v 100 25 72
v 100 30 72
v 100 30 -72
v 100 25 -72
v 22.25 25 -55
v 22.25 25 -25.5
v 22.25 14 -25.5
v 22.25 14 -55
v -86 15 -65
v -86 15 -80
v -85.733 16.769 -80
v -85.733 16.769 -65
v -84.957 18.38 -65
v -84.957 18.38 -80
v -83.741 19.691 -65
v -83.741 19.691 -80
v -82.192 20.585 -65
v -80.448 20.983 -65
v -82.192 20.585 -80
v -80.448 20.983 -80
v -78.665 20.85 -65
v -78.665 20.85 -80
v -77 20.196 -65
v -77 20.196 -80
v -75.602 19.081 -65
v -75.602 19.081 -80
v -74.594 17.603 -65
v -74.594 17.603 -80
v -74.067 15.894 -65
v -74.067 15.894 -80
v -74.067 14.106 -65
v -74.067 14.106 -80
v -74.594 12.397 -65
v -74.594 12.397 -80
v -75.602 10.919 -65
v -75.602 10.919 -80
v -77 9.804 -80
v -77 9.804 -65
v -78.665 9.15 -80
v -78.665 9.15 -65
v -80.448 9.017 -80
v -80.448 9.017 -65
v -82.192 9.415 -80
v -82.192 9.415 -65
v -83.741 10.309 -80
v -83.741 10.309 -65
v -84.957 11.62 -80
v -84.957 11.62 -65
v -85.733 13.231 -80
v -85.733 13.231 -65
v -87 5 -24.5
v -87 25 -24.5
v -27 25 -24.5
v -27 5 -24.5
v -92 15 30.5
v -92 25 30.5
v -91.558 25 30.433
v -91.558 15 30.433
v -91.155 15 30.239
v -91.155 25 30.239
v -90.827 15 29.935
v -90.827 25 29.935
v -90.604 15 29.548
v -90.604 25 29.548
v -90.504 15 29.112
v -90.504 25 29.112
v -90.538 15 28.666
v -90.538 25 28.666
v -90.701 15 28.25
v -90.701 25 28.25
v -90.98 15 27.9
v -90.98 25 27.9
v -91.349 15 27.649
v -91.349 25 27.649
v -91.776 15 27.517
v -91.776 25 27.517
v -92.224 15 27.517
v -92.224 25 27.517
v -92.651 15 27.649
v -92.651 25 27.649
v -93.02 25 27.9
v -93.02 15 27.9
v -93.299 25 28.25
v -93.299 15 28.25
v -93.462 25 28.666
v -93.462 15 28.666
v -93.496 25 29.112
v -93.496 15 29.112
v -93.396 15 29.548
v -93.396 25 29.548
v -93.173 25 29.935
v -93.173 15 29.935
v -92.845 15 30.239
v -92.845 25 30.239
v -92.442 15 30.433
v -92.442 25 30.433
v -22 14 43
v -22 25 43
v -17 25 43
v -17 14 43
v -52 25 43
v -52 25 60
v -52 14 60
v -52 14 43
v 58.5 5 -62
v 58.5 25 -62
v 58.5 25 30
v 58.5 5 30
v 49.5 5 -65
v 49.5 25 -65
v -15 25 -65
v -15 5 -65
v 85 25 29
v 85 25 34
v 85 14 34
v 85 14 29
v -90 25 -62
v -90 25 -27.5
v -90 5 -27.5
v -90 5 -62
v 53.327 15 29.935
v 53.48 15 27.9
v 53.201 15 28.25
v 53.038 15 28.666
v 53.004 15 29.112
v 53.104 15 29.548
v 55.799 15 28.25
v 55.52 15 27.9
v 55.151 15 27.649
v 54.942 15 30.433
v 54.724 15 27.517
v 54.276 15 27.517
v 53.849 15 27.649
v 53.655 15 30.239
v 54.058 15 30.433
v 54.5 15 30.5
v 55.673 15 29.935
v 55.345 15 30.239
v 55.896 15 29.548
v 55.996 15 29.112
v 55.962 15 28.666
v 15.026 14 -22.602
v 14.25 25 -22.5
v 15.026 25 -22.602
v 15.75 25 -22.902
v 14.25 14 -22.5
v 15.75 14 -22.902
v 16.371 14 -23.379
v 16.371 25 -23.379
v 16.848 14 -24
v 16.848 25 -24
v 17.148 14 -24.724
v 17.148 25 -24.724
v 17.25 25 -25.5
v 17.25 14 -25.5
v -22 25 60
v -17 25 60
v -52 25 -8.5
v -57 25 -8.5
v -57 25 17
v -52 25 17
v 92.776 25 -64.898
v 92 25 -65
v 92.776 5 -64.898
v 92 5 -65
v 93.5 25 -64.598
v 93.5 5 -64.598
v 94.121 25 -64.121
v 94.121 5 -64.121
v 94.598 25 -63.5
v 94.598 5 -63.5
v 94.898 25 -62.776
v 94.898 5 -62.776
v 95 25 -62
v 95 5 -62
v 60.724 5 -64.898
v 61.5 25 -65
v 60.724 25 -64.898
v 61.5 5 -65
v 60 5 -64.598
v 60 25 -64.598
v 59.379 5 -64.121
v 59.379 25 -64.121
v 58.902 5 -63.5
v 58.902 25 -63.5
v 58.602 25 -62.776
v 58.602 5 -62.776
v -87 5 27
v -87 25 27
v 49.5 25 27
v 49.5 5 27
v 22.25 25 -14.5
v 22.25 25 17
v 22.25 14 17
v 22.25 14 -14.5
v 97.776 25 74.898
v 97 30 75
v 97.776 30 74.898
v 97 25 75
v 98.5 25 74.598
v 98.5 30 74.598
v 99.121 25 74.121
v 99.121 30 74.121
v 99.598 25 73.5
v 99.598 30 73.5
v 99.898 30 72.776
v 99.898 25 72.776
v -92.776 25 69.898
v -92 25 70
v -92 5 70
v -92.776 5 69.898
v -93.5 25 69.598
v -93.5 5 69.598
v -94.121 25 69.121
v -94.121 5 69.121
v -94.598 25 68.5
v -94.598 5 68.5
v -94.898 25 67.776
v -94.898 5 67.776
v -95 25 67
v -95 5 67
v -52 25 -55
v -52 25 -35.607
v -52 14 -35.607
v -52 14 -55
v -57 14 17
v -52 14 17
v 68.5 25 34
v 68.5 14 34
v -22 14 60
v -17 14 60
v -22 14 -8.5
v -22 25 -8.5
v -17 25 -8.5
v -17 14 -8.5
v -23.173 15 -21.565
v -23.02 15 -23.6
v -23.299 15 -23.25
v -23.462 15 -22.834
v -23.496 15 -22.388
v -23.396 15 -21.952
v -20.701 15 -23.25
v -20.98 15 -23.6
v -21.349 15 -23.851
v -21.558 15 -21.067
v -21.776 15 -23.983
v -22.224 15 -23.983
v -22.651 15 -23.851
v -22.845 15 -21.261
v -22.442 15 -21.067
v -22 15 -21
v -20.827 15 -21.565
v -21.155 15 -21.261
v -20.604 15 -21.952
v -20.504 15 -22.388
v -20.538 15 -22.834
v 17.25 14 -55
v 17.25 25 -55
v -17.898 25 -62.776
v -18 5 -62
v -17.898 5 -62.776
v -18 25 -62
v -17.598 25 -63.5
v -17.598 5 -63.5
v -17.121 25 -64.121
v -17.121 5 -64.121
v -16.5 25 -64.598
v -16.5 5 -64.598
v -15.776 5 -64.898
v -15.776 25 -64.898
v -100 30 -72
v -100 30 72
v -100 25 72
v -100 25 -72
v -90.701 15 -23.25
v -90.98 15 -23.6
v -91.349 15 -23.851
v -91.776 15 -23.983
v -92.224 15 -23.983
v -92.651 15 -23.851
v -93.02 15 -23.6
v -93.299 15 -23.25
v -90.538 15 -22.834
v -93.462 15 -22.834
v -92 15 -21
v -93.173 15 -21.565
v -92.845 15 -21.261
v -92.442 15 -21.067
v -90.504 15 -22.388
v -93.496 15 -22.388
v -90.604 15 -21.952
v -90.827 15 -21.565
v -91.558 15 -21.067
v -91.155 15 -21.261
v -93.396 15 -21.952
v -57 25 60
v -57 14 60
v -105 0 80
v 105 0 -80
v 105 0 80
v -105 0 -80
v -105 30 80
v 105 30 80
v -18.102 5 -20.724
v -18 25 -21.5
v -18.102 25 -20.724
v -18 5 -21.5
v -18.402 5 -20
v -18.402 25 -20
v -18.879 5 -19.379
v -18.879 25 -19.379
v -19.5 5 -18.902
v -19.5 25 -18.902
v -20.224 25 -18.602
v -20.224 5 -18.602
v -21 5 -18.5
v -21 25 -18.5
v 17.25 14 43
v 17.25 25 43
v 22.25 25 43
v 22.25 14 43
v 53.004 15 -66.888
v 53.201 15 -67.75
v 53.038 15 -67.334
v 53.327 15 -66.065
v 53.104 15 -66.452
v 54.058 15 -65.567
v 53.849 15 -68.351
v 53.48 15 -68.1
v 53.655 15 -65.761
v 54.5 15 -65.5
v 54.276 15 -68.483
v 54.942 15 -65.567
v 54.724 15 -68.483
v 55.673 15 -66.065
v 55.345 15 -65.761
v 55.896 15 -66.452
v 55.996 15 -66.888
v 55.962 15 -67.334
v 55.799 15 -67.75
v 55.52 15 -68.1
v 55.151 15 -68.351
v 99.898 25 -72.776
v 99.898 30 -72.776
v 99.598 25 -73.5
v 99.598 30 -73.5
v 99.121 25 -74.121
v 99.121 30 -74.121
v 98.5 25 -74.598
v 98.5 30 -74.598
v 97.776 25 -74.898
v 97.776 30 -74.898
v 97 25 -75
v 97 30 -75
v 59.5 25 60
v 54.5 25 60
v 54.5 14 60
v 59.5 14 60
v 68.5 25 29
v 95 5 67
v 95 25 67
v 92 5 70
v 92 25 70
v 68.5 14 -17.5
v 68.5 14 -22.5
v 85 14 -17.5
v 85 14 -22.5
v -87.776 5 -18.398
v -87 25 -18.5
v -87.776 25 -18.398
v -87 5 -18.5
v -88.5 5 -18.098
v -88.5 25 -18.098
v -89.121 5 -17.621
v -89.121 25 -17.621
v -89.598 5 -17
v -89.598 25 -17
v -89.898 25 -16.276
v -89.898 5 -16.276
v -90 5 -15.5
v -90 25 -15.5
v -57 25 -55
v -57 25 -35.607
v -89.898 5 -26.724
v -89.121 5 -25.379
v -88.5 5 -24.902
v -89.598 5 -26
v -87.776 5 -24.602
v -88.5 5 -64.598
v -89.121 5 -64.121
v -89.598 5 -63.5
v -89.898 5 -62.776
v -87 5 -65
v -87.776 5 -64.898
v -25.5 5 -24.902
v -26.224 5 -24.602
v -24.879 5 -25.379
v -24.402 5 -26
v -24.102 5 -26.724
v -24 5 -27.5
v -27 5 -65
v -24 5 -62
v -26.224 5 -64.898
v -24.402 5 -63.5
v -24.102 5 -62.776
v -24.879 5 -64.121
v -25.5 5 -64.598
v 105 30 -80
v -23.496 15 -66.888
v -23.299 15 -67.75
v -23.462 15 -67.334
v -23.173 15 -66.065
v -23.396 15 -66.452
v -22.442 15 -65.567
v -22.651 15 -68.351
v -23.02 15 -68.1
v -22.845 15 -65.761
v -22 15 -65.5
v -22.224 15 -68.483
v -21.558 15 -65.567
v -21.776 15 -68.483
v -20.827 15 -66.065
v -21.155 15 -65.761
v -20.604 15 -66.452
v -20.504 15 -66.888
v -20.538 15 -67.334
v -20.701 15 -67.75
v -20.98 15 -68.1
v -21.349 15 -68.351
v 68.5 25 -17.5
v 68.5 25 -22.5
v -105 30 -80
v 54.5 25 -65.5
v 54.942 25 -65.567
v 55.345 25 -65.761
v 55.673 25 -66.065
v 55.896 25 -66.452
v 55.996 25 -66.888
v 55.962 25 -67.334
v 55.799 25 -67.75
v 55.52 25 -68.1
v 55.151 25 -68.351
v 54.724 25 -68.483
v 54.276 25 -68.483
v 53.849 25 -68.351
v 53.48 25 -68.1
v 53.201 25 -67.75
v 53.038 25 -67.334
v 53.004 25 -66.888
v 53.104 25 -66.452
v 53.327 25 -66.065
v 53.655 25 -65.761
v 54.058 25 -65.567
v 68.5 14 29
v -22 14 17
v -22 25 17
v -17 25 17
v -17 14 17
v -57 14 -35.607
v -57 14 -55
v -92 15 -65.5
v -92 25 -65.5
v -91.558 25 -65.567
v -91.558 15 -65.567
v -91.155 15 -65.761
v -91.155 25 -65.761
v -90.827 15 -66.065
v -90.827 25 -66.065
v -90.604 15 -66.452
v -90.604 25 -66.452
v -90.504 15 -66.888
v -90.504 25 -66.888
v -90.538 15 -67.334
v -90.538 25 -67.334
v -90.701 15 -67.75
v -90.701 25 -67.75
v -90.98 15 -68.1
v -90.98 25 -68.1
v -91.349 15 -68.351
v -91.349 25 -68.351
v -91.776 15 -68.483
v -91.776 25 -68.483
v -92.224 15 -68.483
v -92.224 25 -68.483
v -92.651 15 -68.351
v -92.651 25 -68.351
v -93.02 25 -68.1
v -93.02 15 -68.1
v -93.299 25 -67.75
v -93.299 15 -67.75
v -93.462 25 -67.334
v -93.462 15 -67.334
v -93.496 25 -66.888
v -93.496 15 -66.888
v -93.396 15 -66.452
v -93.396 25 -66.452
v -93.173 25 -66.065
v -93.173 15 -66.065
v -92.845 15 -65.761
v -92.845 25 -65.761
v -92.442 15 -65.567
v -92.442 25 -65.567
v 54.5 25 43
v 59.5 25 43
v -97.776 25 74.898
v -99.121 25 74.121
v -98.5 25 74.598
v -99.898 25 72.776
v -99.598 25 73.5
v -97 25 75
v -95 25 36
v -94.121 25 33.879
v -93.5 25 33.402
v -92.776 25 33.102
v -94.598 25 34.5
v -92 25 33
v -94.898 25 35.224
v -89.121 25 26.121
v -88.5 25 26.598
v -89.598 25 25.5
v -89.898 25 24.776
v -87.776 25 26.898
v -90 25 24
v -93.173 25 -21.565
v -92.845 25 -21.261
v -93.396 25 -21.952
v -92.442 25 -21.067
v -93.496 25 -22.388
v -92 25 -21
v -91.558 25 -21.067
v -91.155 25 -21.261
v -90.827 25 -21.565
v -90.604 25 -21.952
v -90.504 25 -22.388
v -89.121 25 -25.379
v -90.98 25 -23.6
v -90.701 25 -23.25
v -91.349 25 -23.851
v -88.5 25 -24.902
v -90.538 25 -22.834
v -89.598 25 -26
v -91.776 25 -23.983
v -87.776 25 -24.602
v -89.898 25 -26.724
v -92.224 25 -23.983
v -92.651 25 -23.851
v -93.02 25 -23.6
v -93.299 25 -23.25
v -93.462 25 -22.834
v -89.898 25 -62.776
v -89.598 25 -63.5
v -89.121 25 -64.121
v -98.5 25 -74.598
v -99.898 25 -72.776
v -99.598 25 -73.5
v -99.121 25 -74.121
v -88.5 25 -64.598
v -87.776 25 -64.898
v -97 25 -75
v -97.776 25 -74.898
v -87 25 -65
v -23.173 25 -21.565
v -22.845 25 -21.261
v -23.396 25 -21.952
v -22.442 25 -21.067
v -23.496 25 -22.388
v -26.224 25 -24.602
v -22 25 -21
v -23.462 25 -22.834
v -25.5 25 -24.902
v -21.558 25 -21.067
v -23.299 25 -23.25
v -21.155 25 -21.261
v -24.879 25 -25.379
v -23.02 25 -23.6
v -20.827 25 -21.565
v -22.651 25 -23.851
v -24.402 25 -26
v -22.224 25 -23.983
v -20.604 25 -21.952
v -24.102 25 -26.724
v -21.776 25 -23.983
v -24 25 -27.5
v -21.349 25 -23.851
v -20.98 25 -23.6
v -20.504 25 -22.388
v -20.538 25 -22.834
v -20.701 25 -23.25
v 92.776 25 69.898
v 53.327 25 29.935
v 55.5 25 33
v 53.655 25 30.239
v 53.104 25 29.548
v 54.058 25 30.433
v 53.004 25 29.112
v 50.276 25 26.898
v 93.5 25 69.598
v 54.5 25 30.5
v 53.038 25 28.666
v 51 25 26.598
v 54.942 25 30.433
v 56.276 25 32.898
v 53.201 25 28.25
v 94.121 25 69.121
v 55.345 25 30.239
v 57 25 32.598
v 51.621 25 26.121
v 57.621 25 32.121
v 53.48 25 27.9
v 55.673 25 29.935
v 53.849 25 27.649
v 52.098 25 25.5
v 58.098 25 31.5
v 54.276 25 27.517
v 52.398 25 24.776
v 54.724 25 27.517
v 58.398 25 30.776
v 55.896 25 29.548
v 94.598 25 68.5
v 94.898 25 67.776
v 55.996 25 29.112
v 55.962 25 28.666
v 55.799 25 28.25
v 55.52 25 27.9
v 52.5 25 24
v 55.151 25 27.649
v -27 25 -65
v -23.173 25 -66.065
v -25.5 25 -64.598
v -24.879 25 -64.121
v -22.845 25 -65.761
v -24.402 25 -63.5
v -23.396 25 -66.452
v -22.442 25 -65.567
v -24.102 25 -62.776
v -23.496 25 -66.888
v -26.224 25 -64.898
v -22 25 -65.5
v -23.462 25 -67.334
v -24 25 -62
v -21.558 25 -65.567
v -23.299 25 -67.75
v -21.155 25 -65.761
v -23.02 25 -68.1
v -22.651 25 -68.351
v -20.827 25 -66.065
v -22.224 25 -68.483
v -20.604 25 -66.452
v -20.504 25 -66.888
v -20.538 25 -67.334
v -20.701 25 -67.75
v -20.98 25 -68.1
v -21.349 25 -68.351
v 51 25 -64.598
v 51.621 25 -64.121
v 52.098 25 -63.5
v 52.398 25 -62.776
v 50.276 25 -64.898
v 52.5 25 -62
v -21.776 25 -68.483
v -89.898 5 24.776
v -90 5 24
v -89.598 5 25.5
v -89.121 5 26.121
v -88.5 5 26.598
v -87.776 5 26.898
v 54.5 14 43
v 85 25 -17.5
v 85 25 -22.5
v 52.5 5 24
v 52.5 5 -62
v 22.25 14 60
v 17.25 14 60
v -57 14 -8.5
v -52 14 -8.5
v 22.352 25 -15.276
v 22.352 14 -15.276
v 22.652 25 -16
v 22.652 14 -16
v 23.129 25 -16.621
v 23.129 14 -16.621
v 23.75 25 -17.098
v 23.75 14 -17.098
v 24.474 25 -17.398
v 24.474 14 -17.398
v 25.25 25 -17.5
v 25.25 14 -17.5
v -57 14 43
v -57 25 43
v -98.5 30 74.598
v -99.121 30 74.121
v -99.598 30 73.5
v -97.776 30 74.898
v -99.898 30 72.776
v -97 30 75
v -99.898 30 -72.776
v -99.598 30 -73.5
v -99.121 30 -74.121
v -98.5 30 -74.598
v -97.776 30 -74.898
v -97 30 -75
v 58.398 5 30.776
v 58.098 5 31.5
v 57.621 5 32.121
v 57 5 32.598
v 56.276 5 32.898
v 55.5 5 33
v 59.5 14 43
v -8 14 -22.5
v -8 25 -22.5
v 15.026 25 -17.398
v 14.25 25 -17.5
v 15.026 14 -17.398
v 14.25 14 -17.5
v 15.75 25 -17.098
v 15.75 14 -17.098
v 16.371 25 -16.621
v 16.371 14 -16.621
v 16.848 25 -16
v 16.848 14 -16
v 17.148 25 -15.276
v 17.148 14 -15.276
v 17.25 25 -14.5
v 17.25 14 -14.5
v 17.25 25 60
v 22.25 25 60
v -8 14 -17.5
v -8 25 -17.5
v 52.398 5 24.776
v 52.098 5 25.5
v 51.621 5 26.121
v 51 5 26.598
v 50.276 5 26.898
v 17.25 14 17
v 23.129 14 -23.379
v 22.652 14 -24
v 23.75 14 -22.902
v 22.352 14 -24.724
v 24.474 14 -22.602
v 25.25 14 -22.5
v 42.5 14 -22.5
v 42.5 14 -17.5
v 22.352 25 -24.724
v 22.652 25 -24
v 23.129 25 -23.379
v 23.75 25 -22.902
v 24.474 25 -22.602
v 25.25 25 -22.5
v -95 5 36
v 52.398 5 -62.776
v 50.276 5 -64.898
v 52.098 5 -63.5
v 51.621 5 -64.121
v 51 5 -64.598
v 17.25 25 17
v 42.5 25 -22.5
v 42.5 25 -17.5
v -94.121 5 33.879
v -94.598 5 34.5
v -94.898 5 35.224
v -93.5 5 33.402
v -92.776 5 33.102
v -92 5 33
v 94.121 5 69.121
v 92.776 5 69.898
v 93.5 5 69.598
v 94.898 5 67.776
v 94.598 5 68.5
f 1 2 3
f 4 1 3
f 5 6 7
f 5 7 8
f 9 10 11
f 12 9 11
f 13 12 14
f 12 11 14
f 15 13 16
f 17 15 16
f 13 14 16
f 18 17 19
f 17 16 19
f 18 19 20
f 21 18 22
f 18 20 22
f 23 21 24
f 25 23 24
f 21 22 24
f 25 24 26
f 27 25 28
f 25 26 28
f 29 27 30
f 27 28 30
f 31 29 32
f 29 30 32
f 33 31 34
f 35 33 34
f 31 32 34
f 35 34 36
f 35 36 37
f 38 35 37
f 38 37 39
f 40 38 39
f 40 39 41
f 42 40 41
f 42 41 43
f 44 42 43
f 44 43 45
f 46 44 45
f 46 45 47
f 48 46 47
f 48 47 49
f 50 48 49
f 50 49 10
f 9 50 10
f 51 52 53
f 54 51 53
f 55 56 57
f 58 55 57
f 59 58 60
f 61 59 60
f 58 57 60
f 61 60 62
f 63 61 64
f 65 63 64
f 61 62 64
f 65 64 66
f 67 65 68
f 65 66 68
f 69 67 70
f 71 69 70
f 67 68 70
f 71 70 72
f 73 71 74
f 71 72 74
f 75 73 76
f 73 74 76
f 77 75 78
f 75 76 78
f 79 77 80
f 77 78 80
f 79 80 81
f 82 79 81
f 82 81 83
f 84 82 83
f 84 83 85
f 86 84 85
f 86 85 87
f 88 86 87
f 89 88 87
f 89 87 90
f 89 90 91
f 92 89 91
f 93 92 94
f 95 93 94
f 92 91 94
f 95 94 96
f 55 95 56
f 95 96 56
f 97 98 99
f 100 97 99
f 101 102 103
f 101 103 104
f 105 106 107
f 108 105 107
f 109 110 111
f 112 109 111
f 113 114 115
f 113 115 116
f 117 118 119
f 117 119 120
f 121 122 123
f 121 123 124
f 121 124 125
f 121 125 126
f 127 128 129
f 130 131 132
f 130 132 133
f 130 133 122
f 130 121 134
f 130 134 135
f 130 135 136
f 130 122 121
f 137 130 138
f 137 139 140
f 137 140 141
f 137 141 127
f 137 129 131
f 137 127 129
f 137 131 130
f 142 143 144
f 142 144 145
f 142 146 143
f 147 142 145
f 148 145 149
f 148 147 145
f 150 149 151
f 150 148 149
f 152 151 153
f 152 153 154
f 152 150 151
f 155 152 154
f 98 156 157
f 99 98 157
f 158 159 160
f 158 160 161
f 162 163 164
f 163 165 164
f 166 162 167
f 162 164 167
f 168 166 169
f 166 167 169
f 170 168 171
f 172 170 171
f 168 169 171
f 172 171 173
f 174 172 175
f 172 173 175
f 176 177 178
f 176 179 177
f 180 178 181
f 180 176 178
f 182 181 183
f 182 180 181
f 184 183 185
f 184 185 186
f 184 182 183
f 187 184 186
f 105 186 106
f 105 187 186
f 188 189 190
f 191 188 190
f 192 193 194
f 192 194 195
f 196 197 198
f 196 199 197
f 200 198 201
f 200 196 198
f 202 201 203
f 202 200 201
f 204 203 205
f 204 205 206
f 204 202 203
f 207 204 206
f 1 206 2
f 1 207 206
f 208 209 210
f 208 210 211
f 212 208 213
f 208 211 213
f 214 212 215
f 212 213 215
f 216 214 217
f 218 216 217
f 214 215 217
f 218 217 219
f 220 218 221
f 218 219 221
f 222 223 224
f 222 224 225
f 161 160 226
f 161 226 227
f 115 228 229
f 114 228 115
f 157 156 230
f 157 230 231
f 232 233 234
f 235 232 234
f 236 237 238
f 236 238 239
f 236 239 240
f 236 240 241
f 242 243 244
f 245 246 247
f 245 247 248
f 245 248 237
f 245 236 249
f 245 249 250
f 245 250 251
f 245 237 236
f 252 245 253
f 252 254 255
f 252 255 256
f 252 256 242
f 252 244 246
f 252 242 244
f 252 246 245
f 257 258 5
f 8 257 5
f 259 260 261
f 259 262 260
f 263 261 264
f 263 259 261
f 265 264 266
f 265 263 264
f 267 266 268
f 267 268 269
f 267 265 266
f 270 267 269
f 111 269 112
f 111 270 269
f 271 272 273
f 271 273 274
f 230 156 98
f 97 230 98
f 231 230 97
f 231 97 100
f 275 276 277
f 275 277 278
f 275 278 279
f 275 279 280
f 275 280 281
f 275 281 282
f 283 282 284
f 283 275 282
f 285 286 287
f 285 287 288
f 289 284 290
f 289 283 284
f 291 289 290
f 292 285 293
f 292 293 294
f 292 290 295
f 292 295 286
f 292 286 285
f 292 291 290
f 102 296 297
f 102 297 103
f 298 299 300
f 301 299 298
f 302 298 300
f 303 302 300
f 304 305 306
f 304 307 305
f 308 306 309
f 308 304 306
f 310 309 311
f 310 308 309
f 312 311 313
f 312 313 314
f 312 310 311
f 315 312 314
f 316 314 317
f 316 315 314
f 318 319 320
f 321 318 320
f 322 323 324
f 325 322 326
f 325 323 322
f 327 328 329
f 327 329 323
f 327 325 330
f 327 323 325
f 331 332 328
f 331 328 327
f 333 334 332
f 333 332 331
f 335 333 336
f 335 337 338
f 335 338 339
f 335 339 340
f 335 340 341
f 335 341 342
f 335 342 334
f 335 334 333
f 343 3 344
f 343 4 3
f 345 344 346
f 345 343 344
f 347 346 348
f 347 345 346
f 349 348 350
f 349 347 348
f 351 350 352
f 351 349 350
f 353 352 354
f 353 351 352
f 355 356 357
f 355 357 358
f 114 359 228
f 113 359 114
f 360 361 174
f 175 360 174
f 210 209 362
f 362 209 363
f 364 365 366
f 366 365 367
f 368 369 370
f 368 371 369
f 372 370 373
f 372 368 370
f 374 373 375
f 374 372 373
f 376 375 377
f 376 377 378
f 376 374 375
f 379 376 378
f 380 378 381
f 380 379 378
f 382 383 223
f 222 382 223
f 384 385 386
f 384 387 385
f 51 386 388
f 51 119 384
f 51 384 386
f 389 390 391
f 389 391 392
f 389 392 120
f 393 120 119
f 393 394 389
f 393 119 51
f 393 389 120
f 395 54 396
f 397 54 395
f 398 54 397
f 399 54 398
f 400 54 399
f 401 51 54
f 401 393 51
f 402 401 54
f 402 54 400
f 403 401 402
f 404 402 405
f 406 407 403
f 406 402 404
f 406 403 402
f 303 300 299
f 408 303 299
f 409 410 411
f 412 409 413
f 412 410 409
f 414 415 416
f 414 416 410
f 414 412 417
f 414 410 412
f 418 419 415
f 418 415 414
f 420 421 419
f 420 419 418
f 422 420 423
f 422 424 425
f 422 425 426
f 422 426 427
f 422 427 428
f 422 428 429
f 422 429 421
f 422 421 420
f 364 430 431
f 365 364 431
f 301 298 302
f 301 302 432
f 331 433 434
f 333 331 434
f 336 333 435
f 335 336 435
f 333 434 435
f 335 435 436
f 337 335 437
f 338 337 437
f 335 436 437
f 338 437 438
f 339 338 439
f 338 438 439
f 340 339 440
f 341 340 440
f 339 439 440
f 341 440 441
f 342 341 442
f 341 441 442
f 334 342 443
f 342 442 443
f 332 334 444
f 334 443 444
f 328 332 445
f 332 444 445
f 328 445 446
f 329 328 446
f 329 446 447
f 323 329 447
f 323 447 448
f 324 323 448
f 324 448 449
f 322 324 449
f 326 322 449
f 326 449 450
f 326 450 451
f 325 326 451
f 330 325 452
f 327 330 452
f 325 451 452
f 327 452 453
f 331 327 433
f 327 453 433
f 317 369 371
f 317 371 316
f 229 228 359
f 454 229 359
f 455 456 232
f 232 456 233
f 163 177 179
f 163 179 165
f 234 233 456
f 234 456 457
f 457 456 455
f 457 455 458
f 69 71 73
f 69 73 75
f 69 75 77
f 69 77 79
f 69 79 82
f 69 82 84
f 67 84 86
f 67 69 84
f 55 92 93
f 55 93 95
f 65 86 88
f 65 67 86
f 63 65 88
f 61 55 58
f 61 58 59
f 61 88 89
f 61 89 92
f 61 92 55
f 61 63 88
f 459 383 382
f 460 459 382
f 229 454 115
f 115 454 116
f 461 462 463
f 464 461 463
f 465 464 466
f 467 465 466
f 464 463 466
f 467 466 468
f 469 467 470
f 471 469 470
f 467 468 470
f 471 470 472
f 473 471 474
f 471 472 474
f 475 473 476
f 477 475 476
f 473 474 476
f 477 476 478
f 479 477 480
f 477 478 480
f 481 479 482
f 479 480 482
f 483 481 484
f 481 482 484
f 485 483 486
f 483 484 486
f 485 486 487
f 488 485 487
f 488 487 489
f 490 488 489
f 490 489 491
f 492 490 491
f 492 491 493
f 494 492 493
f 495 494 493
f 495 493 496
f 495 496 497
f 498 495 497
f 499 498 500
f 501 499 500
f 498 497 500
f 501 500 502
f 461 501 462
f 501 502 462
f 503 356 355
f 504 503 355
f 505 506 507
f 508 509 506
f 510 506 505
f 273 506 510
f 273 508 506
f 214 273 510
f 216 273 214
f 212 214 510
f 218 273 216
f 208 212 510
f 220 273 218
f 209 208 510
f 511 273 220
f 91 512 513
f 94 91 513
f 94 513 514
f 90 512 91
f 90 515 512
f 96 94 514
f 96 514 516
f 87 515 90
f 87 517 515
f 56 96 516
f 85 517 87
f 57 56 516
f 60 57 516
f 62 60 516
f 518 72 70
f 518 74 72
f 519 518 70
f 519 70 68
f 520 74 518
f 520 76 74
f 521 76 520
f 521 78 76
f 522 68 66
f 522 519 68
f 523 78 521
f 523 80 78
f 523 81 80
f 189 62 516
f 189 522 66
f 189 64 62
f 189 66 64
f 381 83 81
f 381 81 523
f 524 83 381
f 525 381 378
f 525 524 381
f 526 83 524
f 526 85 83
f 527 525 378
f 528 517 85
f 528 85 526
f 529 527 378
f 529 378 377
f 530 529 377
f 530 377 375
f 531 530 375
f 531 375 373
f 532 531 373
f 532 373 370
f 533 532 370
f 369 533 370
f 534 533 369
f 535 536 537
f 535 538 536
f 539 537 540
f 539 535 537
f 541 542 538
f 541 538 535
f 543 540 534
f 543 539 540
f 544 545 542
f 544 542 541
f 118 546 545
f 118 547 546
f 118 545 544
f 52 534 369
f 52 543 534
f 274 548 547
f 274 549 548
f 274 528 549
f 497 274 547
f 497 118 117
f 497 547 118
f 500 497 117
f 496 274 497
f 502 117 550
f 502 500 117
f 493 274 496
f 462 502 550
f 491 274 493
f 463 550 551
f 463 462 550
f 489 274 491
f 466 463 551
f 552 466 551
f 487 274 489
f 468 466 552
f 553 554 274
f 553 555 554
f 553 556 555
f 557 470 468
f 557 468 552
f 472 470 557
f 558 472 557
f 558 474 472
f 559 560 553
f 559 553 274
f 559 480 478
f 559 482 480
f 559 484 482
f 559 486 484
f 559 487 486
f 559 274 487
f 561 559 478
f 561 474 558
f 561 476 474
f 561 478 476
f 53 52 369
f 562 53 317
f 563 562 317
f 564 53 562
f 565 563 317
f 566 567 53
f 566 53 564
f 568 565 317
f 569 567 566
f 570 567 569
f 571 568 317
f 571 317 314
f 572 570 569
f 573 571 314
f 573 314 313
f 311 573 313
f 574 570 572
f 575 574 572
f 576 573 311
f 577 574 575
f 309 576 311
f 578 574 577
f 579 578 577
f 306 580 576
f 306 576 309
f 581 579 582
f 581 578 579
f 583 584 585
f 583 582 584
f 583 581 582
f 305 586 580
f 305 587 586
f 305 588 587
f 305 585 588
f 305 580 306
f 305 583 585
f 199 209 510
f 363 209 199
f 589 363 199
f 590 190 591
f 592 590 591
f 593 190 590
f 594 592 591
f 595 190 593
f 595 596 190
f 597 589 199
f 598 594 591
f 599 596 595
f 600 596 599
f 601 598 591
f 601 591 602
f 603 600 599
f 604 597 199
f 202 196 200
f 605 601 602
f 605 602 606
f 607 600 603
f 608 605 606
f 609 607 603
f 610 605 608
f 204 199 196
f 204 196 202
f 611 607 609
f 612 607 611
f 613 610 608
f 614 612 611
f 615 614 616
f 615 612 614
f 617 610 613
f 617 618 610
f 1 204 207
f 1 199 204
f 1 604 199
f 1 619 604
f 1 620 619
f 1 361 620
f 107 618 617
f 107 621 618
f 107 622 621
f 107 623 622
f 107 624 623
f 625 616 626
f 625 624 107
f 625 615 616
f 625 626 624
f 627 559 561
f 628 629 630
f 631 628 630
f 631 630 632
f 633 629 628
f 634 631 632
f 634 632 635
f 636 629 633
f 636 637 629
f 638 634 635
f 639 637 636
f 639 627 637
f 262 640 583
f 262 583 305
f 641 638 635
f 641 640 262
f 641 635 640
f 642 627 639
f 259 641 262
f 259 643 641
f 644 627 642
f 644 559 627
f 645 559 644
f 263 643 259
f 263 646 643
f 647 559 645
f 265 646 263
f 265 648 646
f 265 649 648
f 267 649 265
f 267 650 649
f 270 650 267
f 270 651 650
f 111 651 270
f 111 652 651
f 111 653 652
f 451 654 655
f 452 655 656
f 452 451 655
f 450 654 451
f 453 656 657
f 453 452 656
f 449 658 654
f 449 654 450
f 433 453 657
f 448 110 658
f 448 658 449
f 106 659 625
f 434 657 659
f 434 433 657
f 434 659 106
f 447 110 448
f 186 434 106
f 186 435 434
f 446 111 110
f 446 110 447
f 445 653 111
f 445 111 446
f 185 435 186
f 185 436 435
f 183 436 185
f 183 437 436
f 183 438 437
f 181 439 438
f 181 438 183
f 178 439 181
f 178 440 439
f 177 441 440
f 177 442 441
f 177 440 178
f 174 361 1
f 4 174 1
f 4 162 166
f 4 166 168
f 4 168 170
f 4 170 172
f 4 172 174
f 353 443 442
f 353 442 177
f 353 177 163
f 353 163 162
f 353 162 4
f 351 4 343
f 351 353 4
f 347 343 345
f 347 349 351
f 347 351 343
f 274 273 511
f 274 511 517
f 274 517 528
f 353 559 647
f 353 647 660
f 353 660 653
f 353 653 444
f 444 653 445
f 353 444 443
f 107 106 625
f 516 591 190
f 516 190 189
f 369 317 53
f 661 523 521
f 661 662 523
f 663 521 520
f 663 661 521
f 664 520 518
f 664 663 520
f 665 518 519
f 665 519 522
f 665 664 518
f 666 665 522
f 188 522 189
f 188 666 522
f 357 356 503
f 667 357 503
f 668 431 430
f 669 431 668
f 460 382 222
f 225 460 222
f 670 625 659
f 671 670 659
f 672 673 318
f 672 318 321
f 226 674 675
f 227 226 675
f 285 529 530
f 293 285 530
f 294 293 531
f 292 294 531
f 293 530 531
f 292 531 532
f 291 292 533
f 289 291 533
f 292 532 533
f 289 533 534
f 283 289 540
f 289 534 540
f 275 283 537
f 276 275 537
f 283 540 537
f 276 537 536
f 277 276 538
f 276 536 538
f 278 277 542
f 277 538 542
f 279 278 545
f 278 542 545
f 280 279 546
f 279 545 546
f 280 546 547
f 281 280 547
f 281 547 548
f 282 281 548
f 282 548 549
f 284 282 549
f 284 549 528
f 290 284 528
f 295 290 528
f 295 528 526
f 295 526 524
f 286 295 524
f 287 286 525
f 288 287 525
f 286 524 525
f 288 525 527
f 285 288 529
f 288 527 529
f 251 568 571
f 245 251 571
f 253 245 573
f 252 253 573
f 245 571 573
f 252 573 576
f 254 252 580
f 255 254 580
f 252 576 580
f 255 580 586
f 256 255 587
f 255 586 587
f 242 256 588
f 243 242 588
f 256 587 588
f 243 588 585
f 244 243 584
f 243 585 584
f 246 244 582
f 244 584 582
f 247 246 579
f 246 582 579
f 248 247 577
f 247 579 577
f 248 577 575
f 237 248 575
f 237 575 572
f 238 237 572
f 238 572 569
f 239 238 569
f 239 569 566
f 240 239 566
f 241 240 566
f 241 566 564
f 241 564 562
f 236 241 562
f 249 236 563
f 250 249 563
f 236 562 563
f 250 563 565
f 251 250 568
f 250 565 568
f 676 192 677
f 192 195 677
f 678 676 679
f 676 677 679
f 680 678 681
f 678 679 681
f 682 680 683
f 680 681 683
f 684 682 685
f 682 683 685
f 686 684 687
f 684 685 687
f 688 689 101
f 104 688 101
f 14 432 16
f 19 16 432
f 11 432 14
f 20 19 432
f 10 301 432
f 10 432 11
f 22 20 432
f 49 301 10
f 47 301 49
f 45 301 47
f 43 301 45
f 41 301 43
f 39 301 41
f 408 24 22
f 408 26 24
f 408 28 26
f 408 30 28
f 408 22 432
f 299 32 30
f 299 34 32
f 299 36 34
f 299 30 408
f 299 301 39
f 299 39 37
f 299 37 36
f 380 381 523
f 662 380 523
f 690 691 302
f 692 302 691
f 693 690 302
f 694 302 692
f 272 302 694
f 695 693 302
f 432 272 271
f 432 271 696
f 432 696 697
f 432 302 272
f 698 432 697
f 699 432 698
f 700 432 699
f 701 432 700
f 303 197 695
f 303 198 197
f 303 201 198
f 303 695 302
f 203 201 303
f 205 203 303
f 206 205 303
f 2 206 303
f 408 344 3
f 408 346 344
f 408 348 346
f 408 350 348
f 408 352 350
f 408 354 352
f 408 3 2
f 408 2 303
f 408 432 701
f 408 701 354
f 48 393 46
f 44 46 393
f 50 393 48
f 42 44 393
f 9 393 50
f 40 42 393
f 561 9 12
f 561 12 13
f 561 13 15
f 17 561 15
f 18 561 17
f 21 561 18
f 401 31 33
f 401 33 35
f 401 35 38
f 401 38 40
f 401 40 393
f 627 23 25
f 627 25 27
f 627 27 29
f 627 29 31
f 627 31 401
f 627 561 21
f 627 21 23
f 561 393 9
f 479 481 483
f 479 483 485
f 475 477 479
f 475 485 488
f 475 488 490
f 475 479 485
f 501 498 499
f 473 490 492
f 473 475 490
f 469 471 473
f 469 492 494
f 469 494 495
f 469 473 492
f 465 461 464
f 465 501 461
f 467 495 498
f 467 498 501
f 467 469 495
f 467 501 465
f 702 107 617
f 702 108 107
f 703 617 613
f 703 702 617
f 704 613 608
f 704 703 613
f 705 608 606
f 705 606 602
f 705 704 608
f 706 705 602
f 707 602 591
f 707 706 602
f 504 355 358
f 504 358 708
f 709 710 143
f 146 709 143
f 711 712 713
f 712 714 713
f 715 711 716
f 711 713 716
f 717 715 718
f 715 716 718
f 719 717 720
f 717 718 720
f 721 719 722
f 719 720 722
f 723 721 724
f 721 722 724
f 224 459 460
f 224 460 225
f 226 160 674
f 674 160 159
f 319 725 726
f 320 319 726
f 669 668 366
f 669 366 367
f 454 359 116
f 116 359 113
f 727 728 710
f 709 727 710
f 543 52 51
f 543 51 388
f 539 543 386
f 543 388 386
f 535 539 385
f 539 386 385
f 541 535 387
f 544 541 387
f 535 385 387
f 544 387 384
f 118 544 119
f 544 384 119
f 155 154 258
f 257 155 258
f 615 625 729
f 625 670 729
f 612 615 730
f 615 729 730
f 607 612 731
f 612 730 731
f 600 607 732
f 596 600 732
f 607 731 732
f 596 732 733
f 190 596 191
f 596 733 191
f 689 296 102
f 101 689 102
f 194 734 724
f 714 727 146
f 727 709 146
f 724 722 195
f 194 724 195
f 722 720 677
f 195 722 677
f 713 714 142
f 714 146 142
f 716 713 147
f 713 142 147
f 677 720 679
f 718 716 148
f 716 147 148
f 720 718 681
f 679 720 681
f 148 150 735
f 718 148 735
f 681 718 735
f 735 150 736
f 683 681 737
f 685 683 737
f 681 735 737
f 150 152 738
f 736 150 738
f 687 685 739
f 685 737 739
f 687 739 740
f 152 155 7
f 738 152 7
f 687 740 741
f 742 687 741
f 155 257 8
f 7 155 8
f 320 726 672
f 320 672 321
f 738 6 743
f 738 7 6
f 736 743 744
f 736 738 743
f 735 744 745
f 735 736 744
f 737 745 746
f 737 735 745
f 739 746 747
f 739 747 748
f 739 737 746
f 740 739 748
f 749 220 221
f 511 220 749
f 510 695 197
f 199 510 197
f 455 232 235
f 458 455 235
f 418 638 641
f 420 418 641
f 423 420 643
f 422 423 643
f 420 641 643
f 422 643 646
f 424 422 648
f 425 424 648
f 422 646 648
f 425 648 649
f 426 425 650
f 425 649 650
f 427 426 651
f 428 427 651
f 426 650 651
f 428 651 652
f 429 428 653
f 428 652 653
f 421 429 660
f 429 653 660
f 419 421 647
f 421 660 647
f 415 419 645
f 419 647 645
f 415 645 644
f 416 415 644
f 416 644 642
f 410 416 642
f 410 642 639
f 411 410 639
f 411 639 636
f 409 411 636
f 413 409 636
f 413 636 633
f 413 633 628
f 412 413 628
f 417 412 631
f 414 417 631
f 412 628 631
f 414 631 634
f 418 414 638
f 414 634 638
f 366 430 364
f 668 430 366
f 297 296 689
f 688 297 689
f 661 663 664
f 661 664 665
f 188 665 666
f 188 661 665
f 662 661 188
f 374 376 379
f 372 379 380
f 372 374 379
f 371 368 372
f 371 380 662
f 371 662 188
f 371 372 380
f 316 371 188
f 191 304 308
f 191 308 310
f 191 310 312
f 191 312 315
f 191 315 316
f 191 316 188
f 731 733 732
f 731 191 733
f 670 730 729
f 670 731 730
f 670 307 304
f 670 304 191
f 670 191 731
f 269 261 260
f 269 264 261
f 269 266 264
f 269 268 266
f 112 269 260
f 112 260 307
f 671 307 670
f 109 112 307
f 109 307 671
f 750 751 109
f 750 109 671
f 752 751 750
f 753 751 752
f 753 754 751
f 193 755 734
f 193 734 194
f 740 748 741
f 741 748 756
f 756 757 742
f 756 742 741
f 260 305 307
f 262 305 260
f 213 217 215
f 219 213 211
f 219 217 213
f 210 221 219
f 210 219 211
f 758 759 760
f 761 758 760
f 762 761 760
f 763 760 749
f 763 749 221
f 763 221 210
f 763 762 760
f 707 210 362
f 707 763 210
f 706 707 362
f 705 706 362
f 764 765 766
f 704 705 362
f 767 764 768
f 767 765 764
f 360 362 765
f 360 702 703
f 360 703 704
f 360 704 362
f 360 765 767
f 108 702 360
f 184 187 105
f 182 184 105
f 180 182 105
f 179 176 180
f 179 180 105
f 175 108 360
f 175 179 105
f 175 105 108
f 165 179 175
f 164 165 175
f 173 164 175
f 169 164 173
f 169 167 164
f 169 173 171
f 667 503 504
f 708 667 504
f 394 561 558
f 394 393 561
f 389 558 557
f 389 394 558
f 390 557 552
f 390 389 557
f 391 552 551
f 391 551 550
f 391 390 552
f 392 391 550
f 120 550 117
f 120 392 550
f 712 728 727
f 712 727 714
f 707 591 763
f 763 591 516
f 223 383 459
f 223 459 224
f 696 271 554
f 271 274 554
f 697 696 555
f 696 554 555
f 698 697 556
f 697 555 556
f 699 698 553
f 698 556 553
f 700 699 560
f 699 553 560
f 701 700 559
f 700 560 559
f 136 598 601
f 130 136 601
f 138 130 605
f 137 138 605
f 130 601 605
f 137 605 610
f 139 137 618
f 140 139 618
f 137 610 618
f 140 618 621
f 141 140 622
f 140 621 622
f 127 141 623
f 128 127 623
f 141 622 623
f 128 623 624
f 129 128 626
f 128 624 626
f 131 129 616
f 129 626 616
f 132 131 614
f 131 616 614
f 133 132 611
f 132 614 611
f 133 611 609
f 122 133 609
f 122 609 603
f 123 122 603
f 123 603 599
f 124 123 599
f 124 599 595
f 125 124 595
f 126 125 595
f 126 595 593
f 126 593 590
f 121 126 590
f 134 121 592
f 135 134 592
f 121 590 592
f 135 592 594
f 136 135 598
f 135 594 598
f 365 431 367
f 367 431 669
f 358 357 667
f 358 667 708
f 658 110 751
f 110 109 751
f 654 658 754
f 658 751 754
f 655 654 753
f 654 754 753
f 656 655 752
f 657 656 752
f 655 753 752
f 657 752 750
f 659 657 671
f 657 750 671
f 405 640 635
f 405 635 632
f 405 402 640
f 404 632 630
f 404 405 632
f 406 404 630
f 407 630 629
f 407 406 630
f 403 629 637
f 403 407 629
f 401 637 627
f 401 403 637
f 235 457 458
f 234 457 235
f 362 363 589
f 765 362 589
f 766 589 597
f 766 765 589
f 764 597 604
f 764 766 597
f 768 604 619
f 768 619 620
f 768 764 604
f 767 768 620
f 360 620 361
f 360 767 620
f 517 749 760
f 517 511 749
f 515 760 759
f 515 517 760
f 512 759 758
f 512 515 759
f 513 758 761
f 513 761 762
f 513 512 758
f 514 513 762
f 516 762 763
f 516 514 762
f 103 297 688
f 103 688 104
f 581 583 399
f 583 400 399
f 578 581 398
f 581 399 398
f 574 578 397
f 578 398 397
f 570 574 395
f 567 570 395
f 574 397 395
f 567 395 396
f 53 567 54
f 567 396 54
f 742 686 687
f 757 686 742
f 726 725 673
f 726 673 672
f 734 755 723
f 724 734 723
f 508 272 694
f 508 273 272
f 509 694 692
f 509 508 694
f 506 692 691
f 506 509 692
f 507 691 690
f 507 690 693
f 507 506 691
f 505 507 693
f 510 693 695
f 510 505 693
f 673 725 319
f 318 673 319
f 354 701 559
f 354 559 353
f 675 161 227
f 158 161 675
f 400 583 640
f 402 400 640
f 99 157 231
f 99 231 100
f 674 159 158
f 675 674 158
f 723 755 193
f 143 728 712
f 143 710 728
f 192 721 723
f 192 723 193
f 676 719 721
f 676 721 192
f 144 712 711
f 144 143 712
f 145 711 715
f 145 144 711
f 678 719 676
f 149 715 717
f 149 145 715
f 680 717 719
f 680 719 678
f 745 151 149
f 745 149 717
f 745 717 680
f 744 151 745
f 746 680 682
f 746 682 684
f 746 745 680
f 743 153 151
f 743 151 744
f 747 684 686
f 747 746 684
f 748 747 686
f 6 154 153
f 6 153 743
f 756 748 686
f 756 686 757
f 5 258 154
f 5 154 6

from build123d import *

# Parameters (mm, degrees)
SKETCH1_W             = 210
SKETCH1_H             = 160
BOSS_EXTRUDE1_DEPTH   = 30
SKETCH9_W             = 200
SKETCH9_H             = 150
CUT_EXTRUDE3_DEPTH    = 5
SKETCH3_R             = 1.5
CUT_EXTRUDE1_DEPTH    = 10
SKETCH12_W            = 190
SKETCH12_H            = 140
CUT_EXTRUDE4_DEPTH    = 25
SKETCH13_W            = 78
SKETCH13_H            = 52.5
SKETCH13_W_2          = 66
SKETCH13_H_2          = 40.5
EXTRUDE_THIN1_DEPTH   = 25
EXTRUDE_THIN2_DEPTH   = 25
SKETCH15_R            = 1.5
CUT_EXTRUDE5_DEPTH    = 10
BOSS_EXTRUDE2_REACH   = 136.35
SKETCH16_W            = 36.5
SKETCH16_H            = 5
FILLET1_R             = 3
FILLET2_R             = 3
FILLET3_R             = 3
CUT_EXTRUDE6_REACH    = 195.714
SKETCH17_R            = 6
SKETCH18_W            = 5
SKETCH18_H            = 72
EXTRUDE_THIN3_DEPTH   = 11
SKETCH18_H_2          = 25.5
EXTRUDE_THIN3_2_DEPTH = 11
SKETCH18_H_3          = 17
EXTRUDE_THIN3_3_DEPTH = 11
SKETCH18_H_4          = 19.393234672
EXTRUDE_THIN3_4_DEPTH = 11
EXTRUDE_THIN3_5_DEPTH = 11
EXTRUDE_THIN3_6_DEPTH = 11
EXTRUDE_THIN3_7_DEPTH = 11
EXTRUDE_THIN3_8_DEPTH = 11
SKETCH19_W            = 50.5
SKETCH19_H            = 5
SKETCH19_W_2          = 16.5
EXTRUDE_THIN4_DEPTH   = 11
FILLET4_R             = 3


with BuildPart() as part:
    # Sketch1 → Boss-Extrude1 (new body)
    with BuildSketch(Plane(origin=(0, 0, 0), x_dir=(1, 0, 0), z_dir=(0, 1, 0))):
        Rectangle(SKETCH1_W, SKETCH1_H)
    extrude(amount=BOSS_EXTRUDE1_DEPTH)

    # Sketch9 → Cut-Extrude3 (cut)
    with BuildSketch(Plane(origin=(0, 30, 0), x_dir=(1, 0, 0), z_dir=(0, 1, 0))):
        Rectangle(SKETCH9_W, SKETCH9_H)
    extrude(amount=-CUT_EXTRUDE3_DEPTH, mode=Mode.SUBTRACT)

    # Sketch3 → Cut-Extrude1 (cut)
    with BuildSketch(Plane(origin=(0, 30, 0), x_dir=(1, 0, 0), z_dir=(0, 1, 0))):
        with Locations(Location((-92, 67, 0), (0, 0, 270))):
            Circle(SKETCH3_R)
        with Locations(Location((-22, 67, 0), (0, 0, 270))):
            Circle(SKETCH3_R)
        with Locations(Location((-92, 22.5, 0), (0, 0, 270))):
            Circle(SKETCH3_R)
        with Locations(Location((-22, 22.5, 0), (0, 0, 270))):
            Circle(SKETCH3_R)
    extrude(amount=-CUT_EXTRUDE1_DEPTH, mode=Mode.SUBTRACT)

    # Sketch12 → Cut-Extrude4 (cut)
    with BuildSketch(Plane(origin=(0, 30, 0), x_dir=(1, 0, 0), z_dir=(0, 1, 0))):
        Rectangle(SKETCH12_W, SKETCH12_H)
    extrude(amount=-CUT_EXTRUDE4_DEPTH, mode=Mode.SUBTRACT)

    # Sketch13 → Extrude-Thin1 (add)
    with BuildSketch(Plane(origin=(0, 25, 0), x_dir=(1, 0, 0), z_dir=(0, 1, 0))):
        with Locations((-57, 44.75)):
            Rectangle(SKETCH13_W, SKETCH13_H)
        with Locations((-57, 44.75)):
            Rectangle(SKETCH13_W_2, SKETCH13_H_2, mode=Mode.SUBTRACT)
    extrude(amount=-EXTRUDE_THIN1_DEPTH)

    # Sketch14 → Extrude-Thin2 (add)
    with BuildSketch(Plane(origin=(0, 25, 0), x_dir=(1, 0, 0), z_dir=(0, 1, 0))):
        Polygon((-90, 19.5), (-90, -27), (52.5, -27), (52.5, 65), (-19, 65), (-19, 71), (58.5, 71), (58.5, -33), (-96, -33), (-96, 19.5), align=None)
    extrude(amount=-EXTRUDE_THIN2_DEPTH)

    # Sketch15 → Cut-Extrude5 (cut)
    with BuildSketch(Plane(origin=(0, 25, 0), x_dir=(1, 0, 0), z_dir=(0, 1, 0))):
        with Locations(Location((54.5, 67, 0), (0, 0, 270))):
            Circle(SKETCH15_R)
        with Locations(Location((-92, -29, 0), (0, 0, 270))):
            Circle(SKETCH15_R)
        with Locations(Location((54.5, -29, 0), (0, 0, 270))):
            Circle(SKETCH15_R)
        with Locations(Location((-92, 67, 0), (0, 0, 270))):
            Circle(SKETCH15_R)
        with Locations(Location((-92, 22.5, 0), (0, 0, 270))):
            Circle(SKETCH15_R)
        with Locations(Location((-22, 22.5, 0), (0, 0, 270))):
            Circle(SKETCH15_R)
        with Locations(Location((-22, 67, 0), (0, 0, 270))):
            Circle(SKETCH15_R)
    extrude(amount=-CUT_EXTRUDE5_DEPTH, mode=Mode.SUBTRACT)

    # Sketch16 → Boss-Extrude2 (add, up to next)
    with BuildSketch(Plane(origin=(0, 25, 0), x_dir=(1, 0, 0), z_dir=(0, 1, 0)), mode=Mode.PRIVATE) as boss_extrude2_sk1:
        with Locations((76.75, 67.5)):
            Rectangle(SKETCH16_W, SKETCH16_H)
    boss_extrude2_tool1 = extrude(boss_extrude2_sk1.sketch, amount=-BOSS_EXTRUDE2_REACH, mode=Mode.PRIVATE) - part.part
    add(boss_extrude2_tool1.solids().sort_by_distance((76.75, 25, -67.5))[0])

    # Fillet1
    fillet1_edges = [part.edges().sort_by_distance(p)[0] for p in [
        (-90, 15, -18.5),
        (-18, 15, -65),
        (-95, 15, 33),
        (-90, 15, 27),
        (52.5, 15, 27),
        (52.5, 15, -65),
        (95, 15, -65),
        (58.5, 15, -65),
        (-95, 15, 70),
        (95, 15, 70),
        (-90, 15, -65),
        (-24, 15, -65),
        (-24, 15, -24.5),
        (-90, 15, -24.5),
    ]]
    fillet(fillet1_edges, radius=FILLET1_R)

    # Fillet2
    fillet2_edges = [part.edges().sort_by_distance(p)[0] for p in [
        (58.5, 15, 33),
        (-18, 15, -18.5),
    ]]
    fillet(fillet2_edges, radius=FILLET2_R)

    # Fillet3
    fillet3_edges = [part.edges().sort_by_distance(p)[0] for p in [
        (-100, 27.5, 75),
        (-100, 27.5, -75),
        (100, 27.5, -75),
        (100, 27.5, 75),
    ]]
    fillet(fillet3_edges, radius=FILLET3_R)

    # Sketch17 → Cut-Extrude6 (cut, up to next)
    with BuildSketch(Plane(origin=(0, 0, -80), x_dir=(-1, 0, 0), z_dir=(0, 0, -1)), mode=Mode.PRIVATE) as cut_extrude6_sk1:
        with Locations((80, 15)):
            Circle(SKETCH17_R)
    cut_extrude6_tool1 = extrude(cut_extrude6_sk1.sketch, amount=-CUT_EXTRUDE6_REACH, mode=Mode.PRIVATE) & part.part
    add(cut_extrude6_tool1.solids().sort_by_distance((-80, 15, -80))[0], mode=Mode.SUBTRACT)


with BuildPart() as body_2:
    # Sketch18 → Extrude-Thin3 (new body)
    with BuildSketch(Plane(origin=(0, 25, 0), x_dir=(1, 0, 0), z_dir=(0, 1, 0))):
        with Locations((19.75, 19)):
            Rectangle(SKETCH18_W, SKETCH18_H)
    extrude(amount=-EXTRUDE_THIN3_DEPTH)

    # Sketch19 → Extrude-Thin4 (add)
    with BuildSketch(Plane(origin=(0, 25, 0), x_dir=(1, 0, 0), z_dir=(0, 1, 0))):
        with Locations((17.25, 20)):
            Rectangle(SKETCH19_W, SKETCH19_H)
        with Locations((76.75, 20)):
            Rectangle(SKETCH19_W_2, SKETCH19_H)
        with Locations((76.75, -31.5)):
            Rectangle(SKETCH19_W_2, SKETCH19_H)
    extrude(amount=-EXTRUDE_THIN4_DEPTH)


with BuildPart() as body_3:
    # Sketch18 → Extrude-Thin3 2 (new body)
    with BuildSketch(Plane(origin=(0, 25, 0), x_dir=(1, 0, 0), z_dir=(0, 1, 0))):
        with Locations((-19.5, -4.25)):
            Rectangle(SKETCH18_W, SKETCH18_H_2)
    extrude(amount=-EXTRUDE_THIN3_2_DEPTH)


with BuildPart() as body_4:
    # Sketch18 → Extrude-Thin3 3 (new body)
    with BuildSketch(Plane(origin=(0, 25, 0), x_dir=(1, 0, 0), z_dir=(0, 1, 0))):
        with Locations((57, -51.5)):
            Rectangle(SKETCH18_W, SKETCH18_H_3)
    extrude(amount=-EXTRUDE_THIN3_3_DEPTH)


with BuildPart() as body_5:
    # Sketch18 → Extrude-Thin3 4 (new body)
    with BuildSketch(Plane(origin=(0, 25, 0), x_dir=(1, 0, 0), z_dir=(0, 1, 0))):
        with Locations((-54.5, 45.303382664)):
            Rectangle(SKETCH18_W, SKETCH18_H_4)
    extrude(amount=-EXTRUDE_THIN3_4_DEPTH)


with BuildPart() as body_6:
    # Sketch18 → Extrude-Thin3 5 (new body)
    with BuildSketch(Plane(origin=(0, 25, 0), x_dir=(1, 0, 0), z_dir=(0, 1, 0))):
        with Locations((-19.5, -51.5)):
            Rectangle(SKETCH18_W, SKETCH18_H_3)
    extrude(amount=-EXTRUDE_THIN3_5_DEPTH)


with BuildPart() as body_7:
    # Sketch18 → Extrude-Thin3 6 (new body)
    with BuildSketch(Plane(origin=(0, 25, 0), x_dir=(1, 0, 0), z_dir=(0, 1, 0))):
        with Locations((19.75, -51.5)):
            Rectangle(SKETCH18_W, SKETCH18_H_3)
    extrude(amount=-EXTRUDE_THIN3_6_DEPTH)


with BuildPart() as body_8:
    # Sketch18 → Extrude-Thin3 7 (new body)
    with BuildSketch(Plane(origin=(0, 25, 0), x_dir=(1, 0, 0), z_dir=(0, 1, 0))):
        with Locations((-54.5, -4.25)):
            Rectangle(SKETCH18_W, SKETCH18_H_2)
    extrude(amount=-EXTRUDE_THIN3_7_DEPTH)


with BuildPart() as body_9:
    # Sketch18 → Extrude-Thin3 8 (new body)
    with BuildSketch(Plane(origin=(0, 25, 0), x_dir=(1, 0, 0), z_dir=(0, 1, 0))):
        with Locations((-54.5, -51.5)):
            Rectangle(SKETCH18_W, SKETCH18_H_3)
    extrude(amount=-EXTRUDE_THIN3_8_DEPTH)


with BuildPart() as extrude_thin4_piece_1:
    # of the separate pieces the step leaves, piece 1, a body of its own (extrude_thin4_pieces)
    add(body_2.part.solids().sort_by_distance((17.25, 25, -55))[0])

    # Fillet4
    fillet4_edges = [extrude_thin4_piece_1.edges().sort_by_distance(p)[0] for p in [
        (22.25, 19.5, -17.5),
        (17.25, 19.5, -22.5),
        (22.25, 19.5, -22.5),
        (17.25, 19.5, -17.5),
    ]]
    fillet(fillet4_edges, radius=FILLET4_R)


with BuildPart() as extrude_thin4_piece_2:
    # of the separate pieces the step leaves, piece 2, a body of its own (extrude_thin4_pieces)
    add(body_2.part.solids().sort_by_distance((68.5, 25, 29))[0])


with BuildPart() as extrude_thin4_piece_3:
    # of the separate pieces the step leaves, piece 3, a body of its own (extrude_thin4_pieces)
    add(body_2.part.solids().sort_by_distance((68.5, 25, -22.5))[0])


solid = Compound([part.part, body_3.part, body_4.part, body_5.part, body_6.part, body_7.part, body_8.part, body_9.part, extrude_thin4_piece_1.part, extrude_thin4_piece_2.part, extrude_thin4_piece_3.part])
